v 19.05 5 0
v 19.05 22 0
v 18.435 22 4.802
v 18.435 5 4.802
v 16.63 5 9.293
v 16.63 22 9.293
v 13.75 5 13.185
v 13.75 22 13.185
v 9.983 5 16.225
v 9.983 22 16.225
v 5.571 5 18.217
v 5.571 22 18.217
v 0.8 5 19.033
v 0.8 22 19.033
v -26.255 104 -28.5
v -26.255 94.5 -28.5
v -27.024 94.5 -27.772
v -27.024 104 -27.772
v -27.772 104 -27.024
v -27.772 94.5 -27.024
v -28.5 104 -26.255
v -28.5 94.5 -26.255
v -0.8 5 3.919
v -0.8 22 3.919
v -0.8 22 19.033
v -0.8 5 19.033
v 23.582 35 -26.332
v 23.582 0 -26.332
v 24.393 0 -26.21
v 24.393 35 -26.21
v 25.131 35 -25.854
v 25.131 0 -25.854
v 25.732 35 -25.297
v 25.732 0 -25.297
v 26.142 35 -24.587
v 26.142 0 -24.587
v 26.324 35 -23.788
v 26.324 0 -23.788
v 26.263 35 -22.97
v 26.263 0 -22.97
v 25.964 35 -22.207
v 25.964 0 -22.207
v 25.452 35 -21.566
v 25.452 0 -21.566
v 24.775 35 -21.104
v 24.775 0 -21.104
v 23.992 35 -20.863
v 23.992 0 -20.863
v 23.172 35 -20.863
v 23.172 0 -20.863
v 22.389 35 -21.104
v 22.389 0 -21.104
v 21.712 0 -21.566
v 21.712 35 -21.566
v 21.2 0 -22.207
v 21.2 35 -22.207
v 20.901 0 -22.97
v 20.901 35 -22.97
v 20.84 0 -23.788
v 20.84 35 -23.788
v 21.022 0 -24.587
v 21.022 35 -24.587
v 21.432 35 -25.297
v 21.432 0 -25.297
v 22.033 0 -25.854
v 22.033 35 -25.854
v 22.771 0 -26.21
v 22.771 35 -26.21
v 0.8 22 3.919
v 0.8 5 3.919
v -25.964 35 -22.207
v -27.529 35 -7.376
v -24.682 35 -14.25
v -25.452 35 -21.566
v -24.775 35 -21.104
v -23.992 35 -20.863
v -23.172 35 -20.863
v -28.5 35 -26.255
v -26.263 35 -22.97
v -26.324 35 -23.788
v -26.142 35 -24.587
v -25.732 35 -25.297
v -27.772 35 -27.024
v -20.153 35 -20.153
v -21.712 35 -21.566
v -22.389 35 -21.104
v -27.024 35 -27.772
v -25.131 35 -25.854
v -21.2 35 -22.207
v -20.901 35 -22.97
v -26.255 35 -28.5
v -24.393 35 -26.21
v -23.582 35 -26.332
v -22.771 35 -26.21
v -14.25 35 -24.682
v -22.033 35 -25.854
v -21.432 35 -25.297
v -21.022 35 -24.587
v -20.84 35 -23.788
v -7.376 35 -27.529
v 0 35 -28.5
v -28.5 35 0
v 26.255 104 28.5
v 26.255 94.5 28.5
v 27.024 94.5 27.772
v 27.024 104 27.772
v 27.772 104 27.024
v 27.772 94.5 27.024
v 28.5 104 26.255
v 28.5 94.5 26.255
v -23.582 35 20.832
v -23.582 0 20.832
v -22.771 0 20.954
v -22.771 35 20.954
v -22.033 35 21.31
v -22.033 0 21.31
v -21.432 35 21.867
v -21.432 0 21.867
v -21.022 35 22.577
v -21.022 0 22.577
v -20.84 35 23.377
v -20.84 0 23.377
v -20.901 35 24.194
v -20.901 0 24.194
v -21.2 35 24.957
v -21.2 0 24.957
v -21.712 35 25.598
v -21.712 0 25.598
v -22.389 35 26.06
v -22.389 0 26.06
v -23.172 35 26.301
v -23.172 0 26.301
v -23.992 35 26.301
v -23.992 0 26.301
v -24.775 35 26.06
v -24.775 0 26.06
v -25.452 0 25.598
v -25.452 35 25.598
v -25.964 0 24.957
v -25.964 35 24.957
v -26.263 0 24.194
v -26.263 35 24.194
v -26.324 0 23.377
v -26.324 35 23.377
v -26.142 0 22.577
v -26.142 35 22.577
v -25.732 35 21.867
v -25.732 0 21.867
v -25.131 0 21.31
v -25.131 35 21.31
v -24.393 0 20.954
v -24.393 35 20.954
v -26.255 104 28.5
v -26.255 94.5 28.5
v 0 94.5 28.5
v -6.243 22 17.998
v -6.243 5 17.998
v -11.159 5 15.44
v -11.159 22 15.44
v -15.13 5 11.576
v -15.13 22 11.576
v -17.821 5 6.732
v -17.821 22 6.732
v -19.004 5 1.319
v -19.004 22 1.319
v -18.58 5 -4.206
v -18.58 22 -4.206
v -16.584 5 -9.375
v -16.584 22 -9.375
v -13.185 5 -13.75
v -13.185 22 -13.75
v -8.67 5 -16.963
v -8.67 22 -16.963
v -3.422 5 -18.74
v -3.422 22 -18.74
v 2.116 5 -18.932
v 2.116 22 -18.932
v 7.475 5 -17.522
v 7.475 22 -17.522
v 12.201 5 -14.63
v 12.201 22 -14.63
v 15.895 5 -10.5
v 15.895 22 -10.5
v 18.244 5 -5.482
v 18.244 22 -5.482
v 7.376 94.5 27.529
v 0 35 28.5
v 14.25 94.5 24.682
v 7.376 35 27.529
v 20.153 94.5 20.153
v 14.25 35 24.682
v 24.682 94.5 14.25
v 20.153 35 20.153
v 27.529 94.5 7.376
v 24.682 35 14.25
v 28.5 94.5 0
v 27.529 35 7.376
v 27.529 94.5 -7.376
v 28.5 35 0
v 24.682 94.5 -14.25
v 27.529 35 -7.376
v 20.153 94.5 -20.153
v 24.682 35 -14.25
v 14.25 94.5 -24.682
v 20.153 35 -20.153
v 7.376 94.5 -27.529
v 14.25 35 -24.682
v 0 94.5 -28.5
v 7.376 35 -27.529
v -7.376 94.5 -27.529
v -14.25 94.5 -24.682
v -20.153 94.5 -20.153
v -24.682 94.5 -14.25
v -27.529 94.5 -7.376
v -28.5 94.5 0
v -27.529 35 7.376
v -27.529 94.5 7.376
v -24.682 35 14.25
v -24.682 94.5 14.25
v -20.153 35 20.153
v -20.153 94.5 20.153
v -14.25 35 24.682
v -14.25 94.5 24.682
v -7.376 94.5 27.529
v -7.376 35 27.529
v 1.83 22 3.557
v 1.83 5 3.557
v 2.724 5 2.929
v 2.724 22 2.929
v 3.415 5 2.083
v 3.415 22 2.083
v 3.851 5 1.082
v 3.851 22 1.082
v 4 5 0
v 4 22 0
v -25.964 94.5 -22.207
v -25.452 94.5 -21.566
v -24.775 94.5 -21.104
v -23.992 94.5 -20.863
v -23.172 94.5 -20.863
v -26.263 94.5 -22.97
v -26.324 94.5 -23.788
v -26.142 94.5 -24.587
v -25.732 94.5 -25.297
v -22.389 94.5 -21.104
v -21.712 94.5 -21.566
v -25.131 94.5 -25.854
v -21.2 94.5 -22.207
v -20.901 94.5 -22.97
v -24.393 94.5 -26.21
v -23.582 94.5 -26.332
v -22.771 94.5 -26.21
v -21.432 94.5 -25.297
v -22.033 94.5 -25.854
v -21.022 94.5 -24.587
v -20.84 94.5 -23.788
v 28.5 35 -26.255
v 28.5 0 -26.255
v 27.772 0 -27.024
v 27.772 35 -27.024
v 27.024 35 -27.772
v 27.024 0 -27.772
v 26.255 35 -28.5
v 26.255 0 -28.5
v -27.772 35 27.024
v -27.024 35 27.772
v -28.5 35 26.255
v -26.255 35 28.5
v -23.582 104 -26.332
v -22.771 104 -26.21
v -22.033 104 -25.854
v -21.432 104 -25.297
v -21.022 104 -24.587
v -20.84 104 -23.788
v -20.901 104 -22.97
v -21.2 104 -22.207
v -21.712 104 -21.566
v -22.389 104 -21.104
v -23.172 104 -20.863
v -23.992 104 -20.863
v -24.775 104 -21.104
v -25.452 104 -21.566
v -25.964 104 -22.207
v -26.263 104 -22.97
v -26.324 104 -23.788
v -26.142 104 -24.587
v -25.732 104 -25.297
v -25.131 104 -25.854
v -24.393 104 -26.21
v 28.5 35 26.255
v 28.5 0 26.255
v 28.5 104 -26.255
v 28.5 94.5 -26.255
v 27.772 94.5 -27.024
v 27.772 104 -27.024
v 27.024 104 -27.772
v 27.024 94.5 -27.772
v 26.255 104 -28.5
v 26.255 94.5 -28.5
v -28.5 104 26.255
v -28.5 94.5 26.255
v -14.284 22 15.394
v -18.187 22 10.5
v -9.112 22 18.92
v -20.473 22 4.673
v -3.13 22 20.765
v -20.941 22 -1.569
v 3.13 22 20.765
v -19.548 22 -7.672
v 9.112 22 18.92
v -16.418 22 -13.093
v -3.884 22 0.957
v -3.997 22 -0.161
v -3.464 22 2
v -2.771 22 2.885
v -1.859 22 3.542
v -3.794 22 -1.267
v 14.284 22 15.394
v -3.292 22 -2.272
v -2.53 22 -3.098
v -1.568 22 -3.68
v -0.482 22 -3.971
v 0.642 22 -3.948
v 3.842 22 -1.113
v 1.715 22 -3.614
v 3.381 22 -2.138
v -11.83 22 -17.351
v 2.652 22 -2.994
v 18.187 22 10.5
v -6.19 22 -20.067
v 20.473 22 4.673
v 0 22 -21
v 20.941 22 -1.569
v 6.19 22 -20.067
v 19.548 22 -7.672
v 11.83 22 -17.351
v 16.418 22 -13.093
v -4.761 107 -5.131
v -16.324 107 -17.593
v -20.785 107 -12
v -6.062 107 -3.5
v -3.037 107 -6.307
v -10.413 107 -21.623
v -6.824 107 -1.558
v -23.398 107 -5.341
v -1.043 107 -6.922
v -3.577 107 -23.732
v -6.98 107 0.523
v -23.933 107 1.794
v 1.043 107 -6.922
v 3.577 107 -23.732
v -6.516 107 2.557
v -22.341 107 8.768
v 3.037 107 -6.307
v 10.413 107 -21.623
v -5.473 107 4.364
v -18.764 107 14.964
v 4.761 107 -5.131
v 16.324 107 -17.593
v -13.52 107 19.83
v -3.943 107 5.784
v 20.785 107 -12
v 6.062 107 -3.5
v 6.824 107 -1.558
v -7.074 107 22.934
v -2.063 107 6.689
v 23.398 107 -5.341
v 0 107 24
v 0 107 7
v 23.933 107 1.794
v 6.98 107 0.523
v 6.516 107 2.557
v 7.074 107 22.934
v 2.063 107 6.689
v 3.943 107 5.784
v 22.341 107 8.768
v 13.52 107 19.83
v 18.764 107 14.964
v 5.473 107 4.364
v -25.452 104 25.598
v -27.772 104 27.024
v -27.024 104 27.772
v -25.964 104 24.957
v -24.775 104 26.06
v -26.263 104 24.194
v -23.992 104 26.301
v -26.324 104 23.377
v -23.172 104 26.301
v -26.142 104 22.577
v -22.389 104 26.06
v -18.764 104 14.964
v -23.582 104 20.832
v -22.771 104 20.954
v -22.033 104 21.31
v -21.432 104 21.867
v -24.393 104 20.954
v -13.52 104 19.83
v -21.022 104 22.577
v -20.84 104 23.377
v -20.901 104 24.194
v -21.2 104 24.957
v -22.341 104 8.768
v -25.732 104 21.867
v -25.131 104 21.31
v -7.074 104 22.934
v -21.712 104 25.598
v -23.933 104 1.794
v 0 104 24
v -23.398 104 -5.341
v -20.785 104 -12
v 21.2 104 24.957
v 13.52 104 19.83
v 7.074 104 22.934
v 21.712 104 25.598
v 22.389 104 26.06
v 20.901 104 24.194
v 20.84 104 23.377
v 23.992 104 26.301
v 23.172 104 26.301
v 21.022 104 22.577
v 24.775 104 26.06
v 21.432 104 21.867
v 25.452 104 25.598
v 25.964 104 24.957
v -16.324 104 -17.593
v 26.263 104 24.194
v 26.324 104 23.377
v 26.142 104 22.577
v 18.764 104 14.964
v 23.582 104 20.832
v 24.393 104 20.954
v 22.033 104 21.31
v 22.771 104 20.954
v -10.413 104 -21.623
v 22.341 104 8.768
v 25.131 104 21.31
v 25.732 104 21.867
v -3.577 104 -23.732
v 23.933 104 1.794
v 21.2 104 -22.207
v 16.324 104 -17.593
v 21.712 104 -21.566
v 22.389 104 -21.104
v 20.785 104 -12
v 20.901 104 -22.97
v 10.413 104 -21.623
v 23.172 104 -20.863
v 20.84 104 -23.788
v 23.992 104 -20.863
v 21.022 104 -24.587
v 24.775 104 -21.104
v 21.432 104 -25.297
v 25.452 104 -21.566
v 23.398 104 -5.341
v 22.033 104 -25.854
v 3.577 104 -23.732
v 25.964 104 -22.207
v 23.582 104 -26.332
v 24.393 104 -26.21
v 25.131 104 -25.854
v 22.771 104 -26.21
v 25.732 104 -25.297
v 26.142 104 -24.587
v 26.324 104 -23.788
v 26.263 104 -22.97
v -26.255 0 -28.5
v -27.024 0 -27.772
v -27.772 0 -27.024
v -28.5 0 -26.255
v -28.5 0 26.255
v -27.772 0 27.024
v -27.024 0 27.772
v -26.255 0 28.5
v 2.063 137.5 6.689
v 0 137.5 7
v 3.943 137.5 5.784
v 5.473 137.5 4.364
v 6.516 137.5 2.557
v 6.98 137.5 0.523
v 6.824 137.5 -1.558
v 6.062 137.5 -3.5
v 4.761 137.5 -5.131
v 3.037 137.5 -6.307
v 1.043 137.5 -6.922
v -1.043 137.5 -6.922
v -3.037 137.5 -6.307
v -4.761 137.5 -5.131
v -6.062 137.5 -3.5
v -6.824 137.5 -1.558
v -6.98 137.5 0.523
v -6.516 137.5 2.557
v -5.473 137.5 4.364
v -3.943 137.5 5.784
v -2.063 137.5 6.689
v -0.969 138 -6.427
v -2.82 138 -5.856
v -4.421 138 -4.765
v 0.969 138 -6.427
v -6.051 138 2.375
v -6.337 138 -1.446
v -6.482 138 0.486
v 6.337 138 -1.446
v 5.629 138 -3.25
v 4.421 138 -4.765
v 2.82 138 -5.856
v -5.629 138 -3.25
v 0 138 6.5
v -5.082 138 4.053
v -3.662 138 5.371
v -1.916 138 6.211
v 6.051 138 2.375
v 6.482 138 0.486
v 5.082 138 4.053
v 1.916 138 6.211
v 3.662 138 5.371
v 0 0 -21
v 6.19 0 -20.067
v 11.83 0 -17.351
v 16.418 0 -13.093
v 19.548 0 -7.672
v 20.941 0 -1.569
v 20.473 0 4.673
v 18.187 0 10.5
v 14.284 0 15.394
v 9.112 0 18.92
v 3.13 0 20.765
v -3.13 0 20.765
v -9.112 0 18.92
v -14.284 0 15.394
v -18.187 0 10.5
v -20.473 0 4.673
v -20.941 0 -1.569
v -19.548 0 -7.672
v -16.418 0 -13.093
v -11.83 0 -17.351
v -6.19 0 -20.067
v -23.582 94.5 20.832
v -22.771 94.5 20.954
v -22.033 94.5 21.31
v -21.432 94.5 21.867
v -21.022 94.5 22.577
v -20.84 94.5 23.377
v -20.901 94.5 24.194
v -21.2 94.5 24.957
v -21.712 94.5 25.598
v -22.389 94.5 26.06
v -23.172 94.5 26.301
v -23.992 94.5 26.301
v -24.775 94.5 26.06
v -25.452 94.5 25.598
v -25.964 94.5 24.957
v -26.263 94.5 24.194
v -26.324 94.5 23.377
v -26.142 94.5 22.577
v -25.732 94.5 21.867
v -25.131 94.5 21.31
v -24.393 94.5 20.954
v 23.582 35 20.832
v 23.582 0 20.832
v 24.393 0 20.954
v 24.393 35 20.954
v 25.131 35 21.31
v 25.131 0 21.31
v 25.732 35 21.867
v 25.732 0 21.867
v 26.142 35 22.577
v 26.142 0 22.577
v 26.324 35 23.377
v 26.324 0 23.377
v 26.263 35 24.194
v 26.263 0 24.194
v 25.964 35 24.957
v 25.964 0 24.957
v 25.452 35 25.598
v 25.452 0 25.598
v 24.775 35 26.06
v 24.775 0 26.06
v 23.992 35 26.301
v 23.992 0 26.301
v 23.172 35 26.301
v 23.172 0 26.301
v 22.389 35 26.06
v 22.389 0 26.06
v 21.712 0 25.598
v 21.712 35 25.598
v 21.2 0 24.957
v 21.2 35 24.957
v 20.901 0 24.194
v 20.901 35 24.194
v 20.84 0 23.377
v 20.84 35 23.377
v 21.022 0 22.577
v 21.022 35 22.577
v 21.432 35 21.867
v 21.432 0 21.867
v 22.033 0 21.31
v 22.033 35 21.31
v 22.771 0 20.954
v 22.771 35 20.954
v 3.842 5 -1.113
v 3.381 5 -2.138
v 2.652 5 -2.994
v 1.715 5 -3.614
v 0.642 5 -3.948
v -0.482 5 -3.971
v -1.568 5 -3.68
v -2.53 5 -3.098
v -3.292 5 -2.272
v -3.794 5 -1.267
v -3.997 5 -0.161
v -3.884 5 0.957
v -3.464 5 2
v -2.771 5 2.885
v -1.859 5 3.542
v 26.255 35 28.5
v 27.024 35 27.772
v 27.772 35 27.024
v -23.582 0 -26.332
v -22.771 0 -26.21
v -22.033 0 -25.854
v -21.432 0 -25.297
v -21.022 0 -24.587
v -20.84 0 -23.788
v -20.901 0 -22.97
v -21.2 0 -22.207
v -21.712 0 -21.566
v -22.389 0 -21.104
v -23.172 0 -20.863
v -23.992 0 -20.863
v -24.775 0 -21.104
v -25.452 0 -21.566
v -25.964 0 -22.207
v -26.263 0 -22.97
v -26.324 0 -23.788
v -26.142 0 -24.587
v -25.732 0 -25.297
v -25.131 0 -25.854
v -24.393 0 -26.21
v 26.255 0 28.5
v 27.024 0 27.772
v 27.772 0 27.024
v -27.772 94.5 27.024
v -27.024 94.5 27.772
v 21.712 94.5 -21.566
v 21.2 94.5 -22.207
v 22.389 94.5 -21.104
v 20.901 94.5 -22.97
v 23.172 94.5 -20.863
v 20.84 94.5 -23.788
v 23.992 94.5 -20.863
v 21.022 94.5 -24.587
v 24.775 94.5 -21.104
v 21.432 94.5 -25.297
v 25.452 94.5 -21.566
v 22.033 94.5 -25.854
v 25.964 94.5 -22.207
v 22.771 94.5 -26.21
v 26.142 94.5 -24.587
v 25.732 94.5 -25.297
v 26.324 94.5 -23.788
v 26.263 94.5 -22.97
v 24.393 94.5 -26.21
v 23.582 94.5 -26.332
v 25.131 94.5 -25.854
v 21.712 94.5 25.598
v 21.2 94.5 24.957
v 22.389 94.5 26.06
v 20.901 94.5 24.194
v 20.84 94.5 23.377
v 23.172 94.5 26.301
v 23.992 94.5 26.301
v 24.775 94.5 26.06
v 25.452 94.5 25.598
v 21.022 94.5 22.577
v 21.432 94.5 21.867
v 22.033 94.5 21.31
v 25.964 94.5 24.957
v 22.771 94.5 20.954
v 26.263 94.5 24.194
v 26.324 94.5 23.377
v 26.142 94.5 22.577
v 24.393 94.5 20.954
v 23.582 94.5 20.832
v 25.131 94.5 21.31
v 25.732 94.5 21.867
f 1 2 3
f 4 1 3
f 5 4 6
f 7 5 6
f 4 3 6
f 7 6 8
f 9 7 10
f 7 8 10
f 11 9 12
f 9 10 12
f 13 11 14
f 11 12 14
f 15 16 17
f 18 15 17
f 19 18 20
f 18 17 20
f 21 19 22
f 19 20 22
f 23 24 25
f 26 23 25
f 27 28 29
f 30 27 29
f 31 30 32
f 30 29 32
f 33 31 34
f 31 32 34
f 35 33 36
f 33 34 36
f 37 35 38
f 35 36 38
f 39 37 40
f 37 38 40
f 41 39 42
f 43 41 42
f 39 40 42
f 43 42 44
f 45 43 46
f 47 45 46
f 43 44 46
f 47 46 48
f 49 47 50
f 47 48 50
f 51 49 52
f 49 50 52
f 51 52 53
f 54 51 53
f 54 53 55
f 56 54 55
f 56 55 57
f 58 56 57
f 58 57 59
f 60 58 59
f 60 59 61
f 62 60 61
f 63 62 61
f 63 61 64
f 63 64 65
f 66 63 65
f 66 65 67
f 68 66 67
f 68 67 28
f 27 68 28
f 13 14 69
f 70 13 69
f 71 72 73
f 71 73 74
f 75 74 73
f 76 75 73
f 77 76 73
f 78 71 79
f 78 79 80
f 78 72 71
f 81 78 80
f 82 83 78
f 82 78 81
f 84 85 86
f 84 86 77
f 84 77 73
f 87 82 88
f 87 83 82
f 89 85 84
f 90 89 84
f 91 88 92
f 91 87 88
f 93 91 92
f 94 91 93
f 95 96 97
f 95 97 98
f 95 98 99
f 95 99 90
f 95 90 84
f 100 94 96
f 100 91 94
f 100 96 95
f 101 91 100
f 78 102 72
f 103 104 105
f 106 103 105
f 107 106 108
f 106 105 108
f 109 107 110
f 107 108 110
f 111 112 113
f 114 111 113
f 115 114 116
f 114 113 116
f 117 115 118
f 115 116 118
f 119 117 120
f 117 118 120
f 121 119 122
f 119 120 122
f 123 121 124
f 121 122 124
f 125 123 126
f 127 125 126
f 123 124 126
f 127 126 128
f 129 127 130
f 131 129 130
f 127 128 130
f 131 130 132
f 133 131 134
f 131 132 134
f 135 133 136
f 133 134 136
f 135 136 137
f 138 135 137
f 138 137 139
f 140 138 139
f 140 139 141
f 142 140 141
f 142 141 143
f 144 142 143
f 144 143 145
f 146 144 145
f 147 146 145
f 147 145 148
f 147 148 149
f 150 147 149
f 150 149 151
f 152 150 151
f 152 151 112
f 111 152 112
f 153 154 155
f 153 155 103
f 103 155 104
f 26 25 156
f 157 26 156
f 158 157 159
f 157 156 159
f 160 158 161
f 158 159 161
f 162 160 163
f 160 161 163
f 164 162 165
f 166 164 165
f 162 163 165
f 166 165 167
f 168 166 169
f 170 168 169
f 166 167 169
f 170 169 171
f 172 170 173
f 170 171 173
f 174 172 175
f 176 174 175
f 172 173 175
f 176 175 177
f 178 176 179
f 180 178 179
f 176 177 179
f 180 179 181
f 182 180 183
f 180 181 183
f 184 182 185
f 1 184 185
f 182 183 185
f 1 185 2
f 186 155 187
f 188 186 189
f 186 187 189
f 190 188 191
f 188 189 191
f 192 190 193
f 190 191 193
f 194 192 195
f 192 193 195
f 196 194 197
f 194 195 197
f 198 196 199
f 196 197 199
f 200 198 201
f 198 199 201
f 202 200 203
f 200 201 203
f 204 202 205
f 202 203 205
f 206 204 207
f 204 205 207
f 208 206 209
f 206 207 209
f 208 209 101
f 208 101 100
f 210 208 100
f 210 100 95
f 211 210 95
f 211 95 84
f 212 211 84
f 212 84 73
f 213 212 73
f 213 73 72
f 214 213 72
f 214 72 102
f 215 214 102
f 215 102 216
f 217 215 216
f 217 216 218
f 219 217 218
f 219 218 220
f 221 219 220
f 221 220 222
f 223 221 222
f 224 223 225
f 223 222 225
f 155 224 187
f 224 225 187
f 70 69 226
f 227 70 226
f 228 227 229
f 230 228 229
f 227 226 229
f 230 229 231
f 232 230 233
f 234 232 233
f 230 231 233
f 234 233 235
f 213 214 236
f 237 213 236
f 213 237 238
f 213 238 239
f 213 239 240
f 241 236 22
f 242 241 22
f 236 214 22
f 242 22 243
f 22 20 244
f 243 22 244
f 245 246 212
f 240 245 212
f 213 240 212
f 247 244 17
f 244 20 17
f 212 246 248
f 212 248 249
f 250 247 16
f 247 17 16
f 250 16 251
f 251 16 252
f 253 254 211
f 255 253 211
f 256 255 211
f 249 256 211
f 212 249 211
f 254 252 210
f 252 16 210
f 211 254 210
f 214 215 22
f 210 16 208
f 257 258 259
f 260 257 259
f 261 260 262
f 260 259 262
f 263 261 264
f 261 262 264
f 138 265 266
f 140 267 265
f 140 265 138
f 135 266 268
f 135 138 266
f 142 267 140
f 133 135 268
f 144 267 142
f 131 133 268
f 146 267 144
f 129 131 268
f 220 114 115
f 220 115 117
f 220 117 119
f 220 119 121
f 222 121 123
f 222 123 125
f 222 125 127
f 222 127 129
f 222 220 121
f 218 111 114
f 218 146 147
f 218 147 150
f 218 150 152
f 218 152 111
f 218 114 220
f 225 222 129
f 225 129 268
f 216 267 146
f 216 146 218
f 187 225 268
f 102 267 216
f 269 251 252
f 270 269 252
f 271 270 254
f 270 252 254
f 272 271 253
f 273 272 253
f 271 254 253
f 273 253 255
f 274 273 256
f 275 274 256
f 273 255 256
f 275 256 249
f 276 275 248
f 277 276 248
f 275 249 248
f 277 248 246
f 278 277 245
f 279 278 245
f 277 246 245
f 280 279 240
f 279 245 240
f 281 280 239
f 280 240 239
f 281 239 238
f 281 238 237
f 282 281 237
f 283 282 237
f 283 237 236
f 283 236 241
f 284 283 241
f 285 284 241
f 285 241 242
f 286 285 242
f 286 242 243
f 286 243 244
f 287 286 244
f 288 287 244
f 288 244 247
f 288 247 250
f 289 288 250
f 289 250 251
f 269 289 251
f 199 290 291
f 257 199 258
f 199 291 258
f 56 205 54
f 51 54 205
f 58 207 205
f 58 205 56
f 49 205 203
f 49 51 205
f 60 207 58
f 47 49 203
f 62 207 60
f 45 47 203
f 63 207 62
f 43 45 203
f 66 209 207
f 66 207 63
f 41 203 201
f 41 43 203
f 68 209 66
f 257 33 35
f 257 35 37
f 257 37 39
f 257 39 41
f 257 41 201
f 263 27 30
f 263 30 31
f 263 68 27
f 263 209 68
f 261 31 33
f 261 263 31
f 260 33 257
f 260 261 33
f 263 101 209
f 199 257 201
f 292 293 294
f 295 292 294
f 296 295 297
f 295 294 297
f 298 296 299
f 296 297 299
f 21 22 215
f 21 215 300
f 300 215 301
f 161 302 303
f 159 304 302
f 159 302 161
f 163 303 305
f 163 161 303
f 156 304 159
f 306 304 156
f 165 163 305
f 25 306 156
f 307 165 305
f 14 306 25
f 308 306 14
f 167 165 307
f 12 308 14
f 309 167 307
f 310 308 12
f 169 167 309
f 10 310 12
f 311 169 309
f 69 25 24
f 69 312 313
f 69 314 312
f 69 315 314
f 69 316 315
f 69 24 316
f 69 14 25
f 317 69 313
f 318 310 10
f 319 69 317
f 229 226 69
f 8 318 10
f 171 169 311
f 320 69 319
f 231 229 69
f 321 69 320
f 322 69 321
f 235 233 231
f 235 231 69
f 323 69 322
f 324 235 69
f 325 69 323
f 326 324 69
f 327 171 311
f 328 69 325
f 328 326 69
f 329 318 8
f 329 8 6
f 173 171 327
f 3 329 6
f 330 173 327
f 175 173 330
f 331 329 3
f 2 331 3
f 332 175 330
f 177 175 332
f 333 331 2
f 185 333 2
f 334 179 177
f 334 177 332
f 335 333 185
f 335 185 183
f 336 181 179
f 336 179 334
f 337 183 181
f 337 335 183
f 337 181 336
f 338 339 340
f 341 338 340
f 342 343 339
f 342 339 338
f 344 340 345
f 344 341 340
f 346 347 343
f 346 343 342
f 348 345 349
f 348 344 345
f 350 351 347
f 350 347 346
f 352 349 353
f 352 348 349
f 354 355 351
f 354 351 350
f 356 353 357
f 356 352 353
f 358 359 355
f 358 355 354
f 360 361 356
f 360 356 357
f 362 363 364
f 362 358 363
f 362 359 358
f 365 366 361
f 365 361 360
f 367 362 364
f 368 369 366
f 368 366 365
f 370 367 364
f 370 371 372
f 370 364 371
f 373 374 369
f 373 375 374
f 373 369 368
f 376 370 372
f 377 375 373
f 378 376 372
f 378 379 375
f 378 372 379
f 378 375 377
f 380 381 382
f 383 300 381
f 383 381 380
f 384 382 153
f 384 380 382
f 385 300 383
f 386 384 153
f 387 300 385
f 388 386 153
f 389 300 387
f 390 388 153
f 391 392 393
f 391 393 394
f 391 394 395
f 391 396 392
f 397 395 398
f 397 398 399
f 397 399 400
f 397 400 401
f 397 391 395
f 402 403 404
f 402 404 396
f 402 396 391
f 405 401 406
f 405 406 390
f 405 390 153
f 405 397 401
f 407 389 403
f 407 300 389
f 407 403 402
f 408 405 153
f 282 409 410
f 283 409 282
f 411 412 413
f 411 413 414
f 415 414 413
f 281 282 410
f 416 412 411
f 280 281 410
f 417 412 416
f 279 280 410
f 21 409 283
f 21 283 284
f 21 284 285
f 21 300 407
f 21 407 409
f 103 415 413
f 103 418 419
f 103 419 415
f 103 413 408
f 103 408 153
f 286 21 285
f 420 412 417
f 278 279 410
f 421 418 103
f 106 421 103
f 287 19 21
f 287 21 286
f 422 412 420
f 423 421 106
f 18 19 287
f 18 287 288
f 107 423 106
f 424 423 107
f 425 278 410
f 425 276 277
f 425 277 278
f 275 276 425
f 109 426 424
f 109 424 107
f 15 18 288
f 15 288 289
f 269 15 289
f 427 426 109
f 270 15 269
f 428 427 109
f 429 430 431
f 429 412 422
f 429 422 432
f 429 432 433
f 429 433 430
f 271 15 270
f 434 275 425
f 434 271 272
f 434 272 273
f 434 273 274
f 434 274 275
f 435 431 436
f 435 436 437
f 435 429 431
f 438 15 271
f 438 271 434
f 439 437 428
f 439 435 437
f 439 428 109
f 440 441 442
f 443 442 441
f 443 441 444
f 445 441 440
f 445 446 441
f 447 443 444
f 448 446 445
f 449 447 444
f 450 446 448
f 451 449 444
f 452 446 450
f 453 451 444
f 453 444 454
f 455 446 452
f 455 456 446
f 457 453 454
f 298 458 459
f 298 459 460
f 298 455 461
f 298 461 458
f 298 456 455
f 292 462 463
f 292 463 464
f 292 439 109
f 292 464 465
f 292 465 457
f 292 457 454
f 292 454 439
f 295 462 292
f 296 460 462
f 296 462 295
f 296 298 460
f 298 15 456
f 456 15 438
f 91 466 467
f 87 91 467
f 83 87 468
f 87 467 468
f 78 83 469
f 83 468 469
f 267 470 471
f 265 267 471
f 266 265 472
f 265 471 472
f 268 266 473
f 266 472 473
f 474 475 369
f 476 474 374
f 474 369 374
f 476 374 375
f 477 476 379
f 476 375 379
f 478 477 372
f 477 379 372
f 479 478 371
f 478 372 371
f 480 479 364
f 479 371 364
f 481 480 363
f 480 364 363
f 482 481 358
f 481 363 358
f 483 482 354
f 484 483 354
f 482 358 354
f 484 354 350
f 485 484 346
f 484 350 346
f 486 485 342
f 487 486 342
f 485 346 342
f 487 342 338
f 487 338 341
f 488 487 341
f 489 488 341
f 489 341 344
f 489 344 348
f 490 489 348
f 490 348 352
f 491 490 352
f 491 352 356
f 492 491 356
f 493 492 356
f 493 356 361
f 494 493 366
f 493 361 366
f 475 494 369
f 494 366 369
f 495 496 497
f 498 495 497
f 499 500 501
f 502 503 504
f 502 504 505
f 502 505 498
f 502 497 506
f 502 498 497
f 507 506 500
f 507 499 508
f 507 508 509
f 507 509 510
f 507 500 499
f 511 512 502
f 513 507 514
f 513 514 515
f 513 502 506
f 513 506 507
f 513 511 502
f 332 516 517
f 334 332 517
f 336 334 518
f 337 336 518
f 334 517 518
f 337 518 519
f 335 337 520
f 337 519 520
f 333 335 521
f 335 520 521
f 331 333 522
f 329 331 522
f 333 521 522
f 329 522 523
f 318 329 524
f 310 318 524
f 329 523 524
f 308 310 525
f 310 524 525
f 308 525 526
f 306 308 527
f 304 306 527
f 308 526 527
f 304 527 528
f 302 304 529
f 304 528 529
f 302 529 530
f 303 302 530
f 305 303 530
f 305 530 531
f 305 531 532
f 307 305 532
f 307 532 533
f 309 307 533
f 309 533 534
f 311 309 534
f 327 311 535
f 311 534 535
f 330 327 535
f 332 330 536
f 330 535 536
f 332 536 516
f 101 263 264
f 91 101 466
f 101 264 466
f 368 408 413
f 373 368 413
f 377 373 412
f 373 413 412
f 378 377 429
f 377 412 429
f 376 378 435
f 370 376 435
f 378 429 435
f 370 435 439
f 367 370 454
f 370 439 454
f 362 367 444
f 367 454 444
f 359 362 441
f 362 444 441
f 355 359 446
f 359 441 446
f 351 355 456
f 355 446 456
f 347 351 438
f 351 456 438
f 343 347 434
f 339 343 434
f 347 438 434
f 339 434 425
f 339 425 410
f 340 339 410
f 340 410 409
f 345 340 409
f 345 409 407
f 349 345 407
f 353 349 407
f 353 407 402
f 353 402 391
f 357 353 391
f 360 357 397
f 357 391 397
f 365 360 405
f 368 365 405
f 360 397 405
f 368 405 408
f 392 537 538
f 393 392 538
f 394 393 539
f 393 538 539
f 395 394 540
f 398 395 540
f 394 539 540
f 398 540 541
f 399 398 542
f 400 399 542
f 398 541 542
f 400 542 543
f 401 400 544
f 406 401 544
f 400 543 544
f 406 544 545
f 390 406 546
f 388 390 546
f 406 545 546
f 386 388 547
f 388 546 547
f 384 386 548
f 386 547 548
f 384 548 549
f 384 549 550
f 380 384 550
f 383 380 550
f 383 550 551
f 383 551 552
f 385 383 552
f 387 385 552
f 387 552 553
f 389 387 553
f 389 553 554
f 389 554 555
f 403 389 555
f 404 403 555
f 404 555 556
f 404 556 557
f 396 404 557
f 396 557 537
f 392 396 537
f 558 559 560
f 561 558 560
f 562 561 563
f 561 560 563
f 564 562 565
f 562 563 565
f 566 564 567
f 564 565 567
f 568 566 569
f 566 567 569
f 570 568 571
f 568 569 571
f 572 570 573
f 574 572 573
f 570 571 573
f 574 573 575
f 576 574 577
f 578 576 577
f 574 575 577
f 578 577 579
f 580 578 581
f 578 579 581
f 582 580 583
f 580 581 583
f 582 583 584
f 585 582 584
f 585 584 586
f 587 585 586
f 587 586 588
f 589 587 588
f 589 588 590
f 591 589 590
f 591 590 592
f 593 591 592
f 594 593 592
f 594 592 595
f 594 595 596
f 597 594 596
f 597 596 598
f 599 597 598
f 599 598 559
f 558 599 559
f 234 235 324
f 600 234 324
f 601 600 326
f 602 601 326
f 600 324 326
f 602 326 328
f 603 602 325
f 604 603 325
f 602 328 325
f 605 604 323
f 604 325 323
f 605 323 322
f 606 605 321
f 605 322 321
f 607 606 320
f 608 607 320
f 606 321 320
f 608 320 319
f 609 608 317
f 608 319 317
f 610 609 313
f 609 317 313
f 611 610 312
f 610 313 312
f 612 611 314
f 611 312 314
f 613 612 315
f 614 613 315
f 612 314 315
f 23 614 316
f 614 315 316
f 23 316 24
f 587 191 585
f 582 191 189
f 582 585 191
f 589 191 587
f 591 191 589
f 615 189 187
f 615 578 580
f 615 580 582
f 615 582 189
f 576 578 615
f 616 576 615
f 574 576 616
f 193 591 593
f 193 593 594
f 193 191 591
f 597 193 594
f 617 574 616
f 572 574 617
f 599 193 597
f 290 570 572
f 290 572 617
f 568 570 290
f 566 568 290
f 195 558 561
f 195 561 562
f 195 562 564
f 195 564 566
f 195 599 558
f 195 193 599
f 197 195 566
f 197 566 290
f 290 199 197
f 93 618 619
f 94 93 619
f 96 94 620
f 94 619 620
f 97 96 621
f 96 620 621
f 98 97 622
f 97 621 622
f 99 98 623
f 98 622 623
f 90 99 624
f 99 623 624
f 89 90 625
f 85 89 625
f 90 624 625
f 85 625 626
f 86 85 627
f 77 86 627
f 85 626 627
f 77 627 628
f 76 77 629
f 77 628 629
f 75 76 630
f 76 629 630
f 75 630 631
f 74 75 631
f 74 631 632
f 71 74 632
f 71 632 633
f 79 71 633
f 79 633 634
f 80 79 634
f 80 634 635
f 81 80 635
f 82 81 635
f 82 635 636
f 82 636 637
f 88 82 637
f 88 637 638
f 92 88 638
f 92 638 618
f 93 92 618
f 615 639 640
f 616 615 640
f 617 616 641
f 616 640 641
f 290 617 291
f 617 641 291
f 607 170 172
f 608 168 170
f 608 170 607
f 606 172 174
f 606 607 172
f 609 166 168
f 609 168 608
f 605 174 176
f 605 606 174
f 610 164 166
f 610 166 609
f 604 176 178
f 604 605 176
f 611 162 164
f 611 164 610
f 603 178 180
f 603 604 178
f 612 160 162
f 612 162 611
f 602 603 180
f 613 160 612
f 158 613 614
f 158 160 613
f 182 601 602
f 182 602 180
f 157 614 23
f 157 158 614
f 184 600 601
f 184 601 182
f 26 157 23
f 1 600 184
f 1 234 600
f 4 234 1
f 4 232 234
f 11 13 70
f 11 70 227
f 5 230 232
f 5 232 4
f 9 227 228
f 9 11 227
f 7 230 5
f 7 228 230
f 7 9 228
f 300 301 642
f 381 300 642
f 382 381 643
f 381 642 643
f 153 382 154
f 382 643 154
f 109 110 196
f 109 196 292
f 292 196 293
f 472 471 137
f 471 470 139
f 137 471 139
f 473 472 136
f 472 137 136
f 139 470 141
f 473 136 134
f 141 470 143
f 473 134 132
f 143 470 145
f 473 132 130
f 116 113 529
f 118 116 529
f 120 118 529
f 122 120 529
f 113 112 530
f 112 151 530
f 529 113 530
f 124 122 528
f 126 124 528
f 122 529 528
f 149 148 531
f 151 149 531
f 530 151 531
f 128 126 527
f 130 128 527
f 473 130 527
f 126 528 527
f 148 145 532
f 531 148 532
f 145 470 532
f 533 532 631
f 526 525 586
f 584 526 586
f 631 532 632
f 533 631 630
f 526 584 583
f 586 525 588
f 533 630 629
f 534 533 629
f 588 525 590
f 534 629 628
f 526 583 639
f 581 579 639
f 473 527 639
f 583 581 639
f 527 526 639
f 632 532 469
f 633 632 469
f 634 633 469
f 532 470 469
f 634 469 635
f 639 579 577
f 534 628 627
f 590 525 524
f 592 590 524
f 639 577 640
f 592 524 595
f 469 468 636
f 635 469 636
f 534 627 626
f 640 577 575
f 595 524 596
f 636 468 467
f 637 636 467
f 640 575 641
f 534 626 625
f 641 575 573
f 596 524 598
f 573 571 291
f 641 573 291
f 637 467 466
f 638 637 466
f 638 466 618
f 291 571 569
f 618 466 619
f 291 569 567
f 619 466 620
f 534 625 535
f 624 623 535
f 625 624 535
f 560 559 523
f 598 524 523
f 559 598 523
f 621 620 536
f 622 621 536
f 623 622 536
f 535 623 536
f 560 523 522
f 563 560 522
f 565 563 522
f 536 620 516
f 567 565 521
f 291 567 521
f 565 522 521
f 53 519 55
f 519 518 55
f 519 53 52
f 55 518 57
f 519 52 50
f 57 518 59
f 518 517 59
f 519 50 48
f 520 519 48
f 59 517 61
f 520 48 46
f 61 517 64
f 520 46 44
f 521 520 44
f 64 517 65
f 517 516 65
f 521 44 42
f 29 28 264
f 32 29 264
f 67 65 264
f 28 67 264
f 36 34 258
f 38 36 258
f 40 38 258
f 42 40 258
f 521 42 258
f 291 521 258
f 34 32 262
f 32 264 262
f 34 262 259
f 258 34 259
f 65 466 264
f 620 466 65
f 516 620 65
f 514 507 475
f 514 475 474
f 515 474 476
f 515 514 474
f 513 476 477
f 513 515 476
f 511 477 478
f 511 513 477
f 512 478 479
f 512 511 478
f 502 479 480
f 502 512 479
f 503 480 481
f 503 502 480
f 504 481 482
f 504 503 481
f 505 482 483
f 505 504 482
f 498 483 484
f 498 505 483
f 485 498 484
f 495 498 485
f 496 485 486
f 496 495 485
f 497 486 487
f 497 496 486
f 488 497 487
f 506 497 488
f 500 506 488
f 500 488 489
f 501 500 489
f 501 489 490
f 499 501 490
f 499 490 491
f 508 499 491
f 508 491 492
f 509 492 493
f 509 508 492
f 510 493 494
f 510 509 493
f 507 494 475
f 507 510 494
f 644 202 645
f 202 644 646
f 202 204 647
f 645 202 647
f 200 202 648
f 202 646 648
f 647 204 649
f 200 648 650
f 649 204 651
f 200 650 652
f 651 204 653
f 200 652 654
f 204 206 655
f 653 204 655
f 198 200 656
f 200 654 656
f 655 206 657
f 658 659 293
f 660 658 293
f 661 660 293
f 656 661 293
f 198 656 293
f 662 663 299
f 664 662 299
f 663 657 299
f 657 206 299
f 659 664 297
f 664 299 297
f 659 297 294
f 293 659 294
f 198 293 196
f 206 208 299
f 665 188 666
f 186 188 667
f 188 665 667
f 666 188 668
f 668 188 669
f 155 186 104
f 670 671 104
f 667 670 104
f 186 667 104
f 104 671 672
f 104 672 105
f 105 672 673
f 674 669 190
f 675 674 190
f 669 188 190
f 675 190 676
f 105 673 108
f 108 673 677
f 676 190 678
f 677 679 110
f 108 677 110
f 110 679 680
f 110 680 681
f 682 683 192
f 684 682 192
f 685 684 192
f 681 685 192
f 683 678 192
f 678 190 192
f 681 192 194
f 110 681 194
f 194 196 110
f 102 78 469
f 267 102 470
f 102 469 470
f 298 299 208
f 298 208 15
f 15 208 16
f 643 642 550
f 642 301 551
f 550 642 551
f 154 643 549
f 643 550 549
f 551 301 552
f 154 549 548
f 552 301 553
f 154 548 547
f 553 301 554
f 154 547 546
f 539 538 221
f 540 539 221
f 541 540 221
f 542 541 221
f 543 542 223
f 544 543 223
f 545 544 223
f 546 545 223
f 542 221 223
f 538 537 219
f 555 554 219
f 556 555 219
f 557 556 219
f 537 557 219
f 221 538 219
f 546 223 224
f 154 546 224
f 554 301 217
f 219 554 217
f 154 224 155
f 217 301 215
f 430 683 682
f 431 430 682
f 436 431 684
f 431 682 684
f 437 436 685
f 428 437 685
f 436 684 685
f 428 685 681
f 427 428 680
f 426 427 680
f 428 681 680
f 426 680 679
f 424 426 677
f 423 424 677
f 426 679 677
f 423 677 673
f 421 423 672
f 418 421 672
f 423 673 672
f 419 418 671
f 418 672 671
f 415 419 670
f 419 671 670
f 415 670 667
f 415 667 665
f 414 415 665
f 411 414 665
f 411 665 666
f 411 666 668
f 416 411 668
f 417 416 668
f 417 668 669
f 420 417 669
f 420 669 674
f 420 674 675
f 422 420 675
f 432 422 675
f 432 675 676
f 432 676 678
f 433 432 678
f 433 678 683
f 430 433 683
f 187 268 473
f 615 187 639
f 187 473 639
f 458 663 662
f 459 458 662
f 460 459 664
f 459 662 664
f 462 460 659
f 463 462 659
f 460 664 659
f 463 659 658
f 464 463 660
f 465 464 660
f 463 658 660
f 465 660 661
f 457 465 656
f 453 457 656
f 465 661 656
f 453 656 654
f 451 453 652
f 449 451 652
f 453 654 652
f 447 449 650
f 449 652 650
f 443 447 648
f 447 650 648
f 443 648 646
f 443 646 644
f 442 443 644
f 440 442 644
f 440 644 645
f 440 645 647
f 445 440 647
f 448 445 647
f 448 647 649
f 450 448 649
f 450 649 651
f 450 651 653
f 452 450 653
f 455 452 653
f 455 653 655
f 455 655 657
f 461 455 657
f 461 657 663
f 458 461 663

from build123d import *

# Parameters (mm, degrees)
EXTRUDE_1_DEPTH     = 35
SKETCH_2_R          = 28.5
EXTRUDE_2_DEPTH     = 69
EXTRUDE_START       = -9.5
EXTRUDE_3_DEPTH     = 9.5
SKETCH_4_R          = 24
EXTRUDE_4_DEPTH     = 3
SKETCH_5_R          = 7
EXTRUDE_5_DEPTH     = 31
SKETCH_6_R          = 2.75
CUT_EXTRUDE_1_DEPTH = 297
SKETCH_7_R          = 21
CUT_EXTRUDE_2_DEPTH = 22
EXTRUDE_6_DEPTH     = 17
CHAMFER_1_SIZE      = 0.5


with BuildPart() as part:
    # 草图1 → 凸台-拉伸1 (new body)
    with BuildSketch(Plane(origin=(0, 0, 0), x_dir=(1, 0, 0), z_dir=(0, 1, 0))):
        with BuildLine():
            Line((26.254761473, 28.5), (-26.254761473, 28.5))
            ThreePointArc((-26.254761473, 28.5), (-27.400387771, 27.400387771), (-28.5, 26.254761473))
            Line((-28.5, 26.254761473), (-28.5, -26.254761473))
            ThreePointArc((-28.5, -26.254761473), (-27.400387771, -27.400387771), (-26.254761473, -28.5))
            Line((-26.254761473, -28.5), (26.254761473, -28.5))
            ThreePointArc((26.254761473, -28.5), (27.400387771, -27.400387771), (28.5, -26.254761473))
            Line((28.5, -26.254761473), (28.5, 26.254761473))
            ThreePointArc((28.5, 26.254761473), (27.400387771, 27.400387771), (26.254761473, 28.5))
        make_face()
    extrude(amount=EXTRUDE_1_DEPTH)

    # 草图2 → 凸台-拉伸2 (add)
    with BuildSketch(Plane(origin=(0, 35, 0), x_dir=(1, 0, 0), z_dir=(0, 1, 0))):
        with Locations(Location((0, 0, 0), (0, 0, 270))):
            Circle(SKETCH_2_R)
    extrude(amount=EXTRUDE_2_DEPTH)

    # 草图3 → 凸台-拉伸3 (add)
    with BuildSketch(Plane(origin=(0, 104, 0), x_dir=(1, 0, 0), z_dir=(0, 1, 0)).offset(EXTRUDE_START)):
        with BuildLine():
            Line((-26.254761473, -28.5), (26.254761473, -28.5))
            ThreePointArc((26.254761473, -28.5), (27.400387771, -27.400387771), (28.5, -26.254761473))
            Line((28.5, -26.254761473), (28.5, 26.254761473))
            ThreePointArc((28.5, 26.254761473), (27.400387771, 27.400387771), (26.254761473, 28.5))
            Line((26.254761473, 28.5), (-26.254761473, 28.5))
            ThreePointArc((-26.254761473, 28.5), (-27.400387771, 27.400387771), (-28.5, 26.254761473))
            Line((-28.5, 26.254761473), (-28.5, -26.254761473))
            ThreePointArc((-28.5, -26.254761473), (-27.400387771, -27.400387771), (-26.254761473, -28.5))
        make_face()
    extrude(amount=EXTRUDE_3_DEPTH)

    # 草图4 → 凸台-拉伸4 (add)
    with BuildSketch(Plane(origin=(0, 104, 0), x_dir=(1, 0, 0), z_dir=(0, 1, 0))):
        with Locations(Location((0, 0, 0), (0, 0, 270))):
            Circle(SKETCH_4_R)
    extrude(amount=EXTRUDE_4_DEPTH)

    # 草图5 → 凸台-拉伸5 (add)
    with BuildSketch(Plane(origin=(0, 107, 0), x_dir=(1, 0, 0), z_dir=(0, 1, 0))):
        with Locations(Location((0, 0, 0), (0, 0, 270))):
            Circle(SKETCH_5_R)
    extrude(amount=EXTRUDE_5_DEPTH)

    # 草图6 → 切除-拉伸1 (cut)
    with BuildSketch(Plane.XZ):
        with Locations(Location((-23.582011153, 23.582011153, 0), (0, 0, 270))):
            Circle(SKETCH_6_R)
        with Locations(Location((23.582011153, 23.582011153, 0), (0, 0, 270))):
            Circle(SKETCH_6_R)
        with Locations(Location((23.582011153, -23.582011153, 0), (0, 0, 270))):
            Circle(SKETCH_6_R)
        with Locations(Location((-23.582011153, -23.582011153, 0), (0, 0, 270))):
            Circle(SKETCH_6_R)
    extrude(amount=-CUT_EXTRUDE_1_DEPTH, mode=Mode.SUBTRACT)

    # 草图7 → 切除-拉伸2 (cut)
    with BuildSketch(Plane.XZ):
        with Locations(Location((0, 0, 0), (0, 0, 270))):
            Circle(SKETCH_7_R)
    extrude(amount=-CUT_EXTRUDE_2_DEPTH, mode=Mode.SUBTRACT)

    # 草图8 → 凸台-拉伸6 (add)
    with BuildSketch(Plane.XZ.offset(-22)):
        with BuildLine():
            Line((-0.8, 3.919183588), (-0.8, 19.033194687))
            ThreePointArc((-0.8, 19.033194687), (-13.184507954, -13.750318178), (19.05, 0))
            ThreePointArc((19.05, 0), (13.750318178, 13.184507954), (0.8, 19.033194687))
            Line((0.8, 19.033194687), (0.8, 3.919183588))
            ThreePointArc((0.8, 3.919183588), (3.098386677, 2.529822128), (4, 0))
            ThreePointArc((4, 0), (-2.529822128, -3.098386677), (-0.8, 3.919183588))
        make_face()
    extrude(amount=EXTRUDE_6_DEPTH)

    # 倒角1
    chamfer_1_edges = [part.edges().sort_by_distance(p)[0] for p in [
        (0, 138, -7),
    ]]
    chamfer(chamfer_1_edges, length=CHAMFER_1_SIZE)


solid = part.part
